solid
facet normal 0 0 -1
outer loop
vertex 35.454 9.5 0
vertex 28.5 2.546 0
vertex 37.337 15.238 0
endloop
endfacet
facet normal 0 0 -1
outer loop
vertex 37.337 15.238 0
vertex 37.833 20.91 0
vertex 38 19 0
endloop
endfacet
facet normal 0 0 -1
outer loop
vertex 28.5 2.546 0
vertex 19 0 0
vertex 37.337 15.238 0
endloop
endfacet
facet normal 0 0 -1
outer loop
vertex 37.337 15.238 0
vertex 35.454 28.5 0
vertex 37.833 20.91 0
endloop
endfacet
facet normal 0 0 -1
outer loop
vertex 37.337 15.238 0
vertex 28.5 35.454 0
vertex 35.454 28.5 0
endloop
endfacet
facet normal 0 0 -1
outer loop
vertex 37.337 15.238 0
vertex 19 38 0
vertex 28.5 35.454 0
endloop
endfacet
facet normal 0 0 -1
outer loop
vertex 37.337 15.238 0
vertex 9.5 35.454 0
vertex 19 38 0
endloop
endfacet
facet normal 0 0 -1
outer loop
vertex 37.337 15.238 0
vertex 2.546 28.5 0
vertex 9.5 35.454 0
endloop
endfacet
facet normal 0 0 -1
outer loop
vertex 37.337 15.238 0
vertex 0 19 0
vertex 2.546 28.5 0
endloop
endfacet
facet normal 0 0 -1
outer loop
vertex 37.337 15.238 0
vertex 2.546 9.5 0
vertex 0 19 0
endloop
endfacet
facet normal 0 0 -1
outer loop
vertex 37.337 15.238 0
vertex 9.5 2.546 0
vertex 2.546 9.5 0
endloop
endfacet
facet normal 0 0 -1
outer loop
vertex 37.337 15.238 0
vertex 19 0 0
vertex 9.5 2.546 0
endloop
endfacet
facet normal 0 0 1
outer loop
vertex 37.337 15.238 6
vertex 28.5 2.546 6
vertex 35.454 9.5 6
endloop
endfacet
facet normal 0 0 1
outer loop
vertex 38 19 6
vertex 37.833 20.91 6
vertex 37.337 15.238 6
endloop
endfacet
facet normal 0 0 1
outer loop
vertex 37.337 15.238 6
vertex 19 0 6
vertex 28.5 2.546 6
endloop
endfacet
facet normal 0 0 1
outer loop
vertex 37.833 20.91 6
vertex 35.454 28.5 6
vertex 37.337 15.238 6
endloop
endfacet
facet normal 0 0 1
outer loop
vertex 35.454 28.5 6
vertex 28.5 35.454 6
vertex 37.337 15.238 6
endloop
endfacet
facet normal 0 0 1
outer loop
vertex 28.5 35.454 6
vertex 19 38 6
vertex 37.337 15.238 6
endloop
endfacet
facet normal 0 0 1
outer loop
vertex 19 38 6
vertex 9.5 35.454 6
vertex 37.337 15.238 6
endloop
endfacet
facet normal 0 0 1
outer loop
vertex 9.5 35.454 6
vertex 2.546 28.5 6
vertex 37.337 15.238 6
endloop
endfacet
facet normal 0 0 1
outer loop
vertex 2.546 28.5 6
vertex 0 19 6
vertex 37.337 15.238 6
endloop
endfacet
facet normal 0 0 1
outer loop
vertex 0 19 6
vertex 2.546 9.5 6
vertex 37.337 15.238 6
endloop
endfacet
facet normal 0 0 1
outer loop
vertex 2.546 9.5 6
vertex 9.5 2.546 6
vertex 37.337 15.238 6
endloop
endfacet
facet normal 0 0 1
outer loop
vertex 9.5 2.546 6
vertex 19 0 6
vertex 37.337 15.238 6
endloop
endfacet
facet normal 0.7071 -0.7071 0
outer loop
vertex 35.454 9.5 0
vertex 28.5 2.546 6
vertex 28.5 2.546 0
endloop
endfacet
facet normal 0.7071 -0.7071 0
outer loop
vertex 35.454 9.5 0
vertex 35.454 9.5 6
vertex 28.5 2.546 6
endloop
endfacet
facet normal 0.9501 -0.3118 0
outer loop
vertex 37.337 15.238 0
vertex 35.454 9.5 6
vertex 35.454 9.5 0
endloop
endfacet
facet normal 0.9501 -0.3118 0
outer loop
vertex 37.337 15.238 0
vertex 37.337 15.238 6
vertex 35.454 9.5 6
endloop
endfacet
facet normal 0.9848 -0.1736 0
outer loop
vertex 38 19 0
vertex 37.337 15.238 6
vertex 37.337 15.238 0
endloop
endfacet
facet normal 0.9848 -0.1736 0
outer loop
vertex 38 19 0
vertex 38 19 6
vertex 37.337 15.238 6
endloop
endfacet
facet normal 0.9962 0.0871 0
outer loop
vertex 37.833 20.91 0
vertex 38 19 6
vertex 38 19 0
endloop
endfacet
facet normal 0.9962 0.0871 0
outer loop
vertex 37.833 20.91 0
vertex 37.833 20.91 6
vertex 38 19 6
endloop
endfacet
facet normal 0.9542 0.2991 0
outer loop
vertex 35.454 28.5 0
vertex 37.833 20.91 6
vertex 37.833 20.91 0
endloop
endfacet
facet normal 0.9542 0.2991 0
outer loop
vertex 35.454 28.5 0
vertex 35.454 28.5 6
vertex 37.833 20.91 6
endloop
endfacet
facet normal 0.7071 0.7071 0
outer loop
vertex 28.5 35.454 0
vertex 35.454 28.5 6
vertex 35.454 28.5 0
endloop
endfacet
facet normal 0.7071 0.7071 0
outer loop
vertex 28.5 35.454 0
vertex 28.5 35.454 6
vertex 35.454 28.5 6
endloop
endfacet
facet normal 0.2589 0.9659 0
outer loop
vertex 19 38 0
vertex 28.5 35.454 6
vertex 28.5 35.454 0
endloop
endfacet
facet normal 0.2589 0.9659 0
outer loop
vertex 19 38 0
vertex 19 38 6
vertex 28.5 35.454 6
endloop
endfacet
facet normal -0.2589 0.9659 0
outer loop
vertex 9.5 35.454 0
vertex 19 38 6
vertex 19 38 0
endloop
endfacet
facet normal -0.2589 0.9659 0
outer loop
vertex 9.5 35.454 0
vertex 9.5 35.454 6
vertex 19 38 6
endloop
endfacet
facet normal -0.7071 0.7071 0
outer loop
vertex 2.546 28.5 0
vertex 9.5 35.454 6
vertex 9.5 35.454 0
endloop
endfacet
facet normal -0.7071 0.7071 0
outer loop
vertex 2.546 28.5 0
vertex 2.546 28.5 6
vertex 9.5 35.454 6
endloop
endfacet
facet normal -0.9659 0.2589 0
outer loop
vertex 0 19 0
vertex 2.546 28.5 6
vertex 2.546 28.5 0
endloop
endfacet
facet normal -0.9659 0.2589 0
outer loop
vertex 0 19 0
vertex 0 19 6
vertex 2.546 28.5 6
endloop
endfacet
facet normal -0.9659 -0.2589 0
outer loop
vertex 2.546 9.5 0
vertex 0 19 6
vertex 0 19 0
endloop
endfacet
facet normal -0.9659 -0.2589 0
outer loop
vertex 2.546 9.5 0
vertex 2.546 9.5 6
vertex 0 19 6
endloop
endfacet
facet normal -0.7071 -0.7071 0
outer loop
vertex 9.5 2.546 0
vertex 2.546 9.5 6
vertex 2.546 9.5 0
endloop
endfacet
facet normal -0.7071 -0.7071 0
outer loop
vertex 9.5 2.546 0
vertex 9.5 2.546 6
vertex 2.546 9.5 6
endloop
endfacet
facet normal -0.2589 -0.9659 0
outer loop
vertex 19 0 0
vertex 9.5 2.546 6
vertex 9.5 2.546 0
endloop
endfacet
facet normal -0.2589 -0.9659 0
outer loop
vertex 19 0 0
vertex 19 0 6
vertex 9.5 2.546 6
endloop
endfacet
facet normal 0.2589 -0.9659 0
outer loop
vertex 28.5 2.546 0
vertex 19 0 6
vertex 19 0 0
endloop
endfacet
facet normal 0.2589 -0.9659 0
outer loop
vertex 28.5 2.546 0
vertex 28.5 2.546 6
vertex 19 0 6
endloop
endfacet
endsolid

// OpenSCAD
$fn = 32;

// ----------------------------------------------------------------------
// Eccentric disc: egg, 6 mm thick
// ----------------------------------------------------------------------

// --- parameters (mm) ---
profile_height = 6;       // extrusion height
profile_points = 14;      // points of the closed outline

profile = [[0, 19], [2.546, 9.5], [9.5, 2.546], [19, 0], [28.5, 2.546], [35.454, 9.5], [37.337, 15.238], [38, 19], [37.833, 20.91], [35.454, 28.5], [28.5, 35.454], [19, 38], [9.5, 35.454], [2.546, 28.5]];  // single closed polygon, 14 points, counter clockwise

// --- the one profile operation ---
linear_extrude(height = profile_height) polygon(points = profile);
